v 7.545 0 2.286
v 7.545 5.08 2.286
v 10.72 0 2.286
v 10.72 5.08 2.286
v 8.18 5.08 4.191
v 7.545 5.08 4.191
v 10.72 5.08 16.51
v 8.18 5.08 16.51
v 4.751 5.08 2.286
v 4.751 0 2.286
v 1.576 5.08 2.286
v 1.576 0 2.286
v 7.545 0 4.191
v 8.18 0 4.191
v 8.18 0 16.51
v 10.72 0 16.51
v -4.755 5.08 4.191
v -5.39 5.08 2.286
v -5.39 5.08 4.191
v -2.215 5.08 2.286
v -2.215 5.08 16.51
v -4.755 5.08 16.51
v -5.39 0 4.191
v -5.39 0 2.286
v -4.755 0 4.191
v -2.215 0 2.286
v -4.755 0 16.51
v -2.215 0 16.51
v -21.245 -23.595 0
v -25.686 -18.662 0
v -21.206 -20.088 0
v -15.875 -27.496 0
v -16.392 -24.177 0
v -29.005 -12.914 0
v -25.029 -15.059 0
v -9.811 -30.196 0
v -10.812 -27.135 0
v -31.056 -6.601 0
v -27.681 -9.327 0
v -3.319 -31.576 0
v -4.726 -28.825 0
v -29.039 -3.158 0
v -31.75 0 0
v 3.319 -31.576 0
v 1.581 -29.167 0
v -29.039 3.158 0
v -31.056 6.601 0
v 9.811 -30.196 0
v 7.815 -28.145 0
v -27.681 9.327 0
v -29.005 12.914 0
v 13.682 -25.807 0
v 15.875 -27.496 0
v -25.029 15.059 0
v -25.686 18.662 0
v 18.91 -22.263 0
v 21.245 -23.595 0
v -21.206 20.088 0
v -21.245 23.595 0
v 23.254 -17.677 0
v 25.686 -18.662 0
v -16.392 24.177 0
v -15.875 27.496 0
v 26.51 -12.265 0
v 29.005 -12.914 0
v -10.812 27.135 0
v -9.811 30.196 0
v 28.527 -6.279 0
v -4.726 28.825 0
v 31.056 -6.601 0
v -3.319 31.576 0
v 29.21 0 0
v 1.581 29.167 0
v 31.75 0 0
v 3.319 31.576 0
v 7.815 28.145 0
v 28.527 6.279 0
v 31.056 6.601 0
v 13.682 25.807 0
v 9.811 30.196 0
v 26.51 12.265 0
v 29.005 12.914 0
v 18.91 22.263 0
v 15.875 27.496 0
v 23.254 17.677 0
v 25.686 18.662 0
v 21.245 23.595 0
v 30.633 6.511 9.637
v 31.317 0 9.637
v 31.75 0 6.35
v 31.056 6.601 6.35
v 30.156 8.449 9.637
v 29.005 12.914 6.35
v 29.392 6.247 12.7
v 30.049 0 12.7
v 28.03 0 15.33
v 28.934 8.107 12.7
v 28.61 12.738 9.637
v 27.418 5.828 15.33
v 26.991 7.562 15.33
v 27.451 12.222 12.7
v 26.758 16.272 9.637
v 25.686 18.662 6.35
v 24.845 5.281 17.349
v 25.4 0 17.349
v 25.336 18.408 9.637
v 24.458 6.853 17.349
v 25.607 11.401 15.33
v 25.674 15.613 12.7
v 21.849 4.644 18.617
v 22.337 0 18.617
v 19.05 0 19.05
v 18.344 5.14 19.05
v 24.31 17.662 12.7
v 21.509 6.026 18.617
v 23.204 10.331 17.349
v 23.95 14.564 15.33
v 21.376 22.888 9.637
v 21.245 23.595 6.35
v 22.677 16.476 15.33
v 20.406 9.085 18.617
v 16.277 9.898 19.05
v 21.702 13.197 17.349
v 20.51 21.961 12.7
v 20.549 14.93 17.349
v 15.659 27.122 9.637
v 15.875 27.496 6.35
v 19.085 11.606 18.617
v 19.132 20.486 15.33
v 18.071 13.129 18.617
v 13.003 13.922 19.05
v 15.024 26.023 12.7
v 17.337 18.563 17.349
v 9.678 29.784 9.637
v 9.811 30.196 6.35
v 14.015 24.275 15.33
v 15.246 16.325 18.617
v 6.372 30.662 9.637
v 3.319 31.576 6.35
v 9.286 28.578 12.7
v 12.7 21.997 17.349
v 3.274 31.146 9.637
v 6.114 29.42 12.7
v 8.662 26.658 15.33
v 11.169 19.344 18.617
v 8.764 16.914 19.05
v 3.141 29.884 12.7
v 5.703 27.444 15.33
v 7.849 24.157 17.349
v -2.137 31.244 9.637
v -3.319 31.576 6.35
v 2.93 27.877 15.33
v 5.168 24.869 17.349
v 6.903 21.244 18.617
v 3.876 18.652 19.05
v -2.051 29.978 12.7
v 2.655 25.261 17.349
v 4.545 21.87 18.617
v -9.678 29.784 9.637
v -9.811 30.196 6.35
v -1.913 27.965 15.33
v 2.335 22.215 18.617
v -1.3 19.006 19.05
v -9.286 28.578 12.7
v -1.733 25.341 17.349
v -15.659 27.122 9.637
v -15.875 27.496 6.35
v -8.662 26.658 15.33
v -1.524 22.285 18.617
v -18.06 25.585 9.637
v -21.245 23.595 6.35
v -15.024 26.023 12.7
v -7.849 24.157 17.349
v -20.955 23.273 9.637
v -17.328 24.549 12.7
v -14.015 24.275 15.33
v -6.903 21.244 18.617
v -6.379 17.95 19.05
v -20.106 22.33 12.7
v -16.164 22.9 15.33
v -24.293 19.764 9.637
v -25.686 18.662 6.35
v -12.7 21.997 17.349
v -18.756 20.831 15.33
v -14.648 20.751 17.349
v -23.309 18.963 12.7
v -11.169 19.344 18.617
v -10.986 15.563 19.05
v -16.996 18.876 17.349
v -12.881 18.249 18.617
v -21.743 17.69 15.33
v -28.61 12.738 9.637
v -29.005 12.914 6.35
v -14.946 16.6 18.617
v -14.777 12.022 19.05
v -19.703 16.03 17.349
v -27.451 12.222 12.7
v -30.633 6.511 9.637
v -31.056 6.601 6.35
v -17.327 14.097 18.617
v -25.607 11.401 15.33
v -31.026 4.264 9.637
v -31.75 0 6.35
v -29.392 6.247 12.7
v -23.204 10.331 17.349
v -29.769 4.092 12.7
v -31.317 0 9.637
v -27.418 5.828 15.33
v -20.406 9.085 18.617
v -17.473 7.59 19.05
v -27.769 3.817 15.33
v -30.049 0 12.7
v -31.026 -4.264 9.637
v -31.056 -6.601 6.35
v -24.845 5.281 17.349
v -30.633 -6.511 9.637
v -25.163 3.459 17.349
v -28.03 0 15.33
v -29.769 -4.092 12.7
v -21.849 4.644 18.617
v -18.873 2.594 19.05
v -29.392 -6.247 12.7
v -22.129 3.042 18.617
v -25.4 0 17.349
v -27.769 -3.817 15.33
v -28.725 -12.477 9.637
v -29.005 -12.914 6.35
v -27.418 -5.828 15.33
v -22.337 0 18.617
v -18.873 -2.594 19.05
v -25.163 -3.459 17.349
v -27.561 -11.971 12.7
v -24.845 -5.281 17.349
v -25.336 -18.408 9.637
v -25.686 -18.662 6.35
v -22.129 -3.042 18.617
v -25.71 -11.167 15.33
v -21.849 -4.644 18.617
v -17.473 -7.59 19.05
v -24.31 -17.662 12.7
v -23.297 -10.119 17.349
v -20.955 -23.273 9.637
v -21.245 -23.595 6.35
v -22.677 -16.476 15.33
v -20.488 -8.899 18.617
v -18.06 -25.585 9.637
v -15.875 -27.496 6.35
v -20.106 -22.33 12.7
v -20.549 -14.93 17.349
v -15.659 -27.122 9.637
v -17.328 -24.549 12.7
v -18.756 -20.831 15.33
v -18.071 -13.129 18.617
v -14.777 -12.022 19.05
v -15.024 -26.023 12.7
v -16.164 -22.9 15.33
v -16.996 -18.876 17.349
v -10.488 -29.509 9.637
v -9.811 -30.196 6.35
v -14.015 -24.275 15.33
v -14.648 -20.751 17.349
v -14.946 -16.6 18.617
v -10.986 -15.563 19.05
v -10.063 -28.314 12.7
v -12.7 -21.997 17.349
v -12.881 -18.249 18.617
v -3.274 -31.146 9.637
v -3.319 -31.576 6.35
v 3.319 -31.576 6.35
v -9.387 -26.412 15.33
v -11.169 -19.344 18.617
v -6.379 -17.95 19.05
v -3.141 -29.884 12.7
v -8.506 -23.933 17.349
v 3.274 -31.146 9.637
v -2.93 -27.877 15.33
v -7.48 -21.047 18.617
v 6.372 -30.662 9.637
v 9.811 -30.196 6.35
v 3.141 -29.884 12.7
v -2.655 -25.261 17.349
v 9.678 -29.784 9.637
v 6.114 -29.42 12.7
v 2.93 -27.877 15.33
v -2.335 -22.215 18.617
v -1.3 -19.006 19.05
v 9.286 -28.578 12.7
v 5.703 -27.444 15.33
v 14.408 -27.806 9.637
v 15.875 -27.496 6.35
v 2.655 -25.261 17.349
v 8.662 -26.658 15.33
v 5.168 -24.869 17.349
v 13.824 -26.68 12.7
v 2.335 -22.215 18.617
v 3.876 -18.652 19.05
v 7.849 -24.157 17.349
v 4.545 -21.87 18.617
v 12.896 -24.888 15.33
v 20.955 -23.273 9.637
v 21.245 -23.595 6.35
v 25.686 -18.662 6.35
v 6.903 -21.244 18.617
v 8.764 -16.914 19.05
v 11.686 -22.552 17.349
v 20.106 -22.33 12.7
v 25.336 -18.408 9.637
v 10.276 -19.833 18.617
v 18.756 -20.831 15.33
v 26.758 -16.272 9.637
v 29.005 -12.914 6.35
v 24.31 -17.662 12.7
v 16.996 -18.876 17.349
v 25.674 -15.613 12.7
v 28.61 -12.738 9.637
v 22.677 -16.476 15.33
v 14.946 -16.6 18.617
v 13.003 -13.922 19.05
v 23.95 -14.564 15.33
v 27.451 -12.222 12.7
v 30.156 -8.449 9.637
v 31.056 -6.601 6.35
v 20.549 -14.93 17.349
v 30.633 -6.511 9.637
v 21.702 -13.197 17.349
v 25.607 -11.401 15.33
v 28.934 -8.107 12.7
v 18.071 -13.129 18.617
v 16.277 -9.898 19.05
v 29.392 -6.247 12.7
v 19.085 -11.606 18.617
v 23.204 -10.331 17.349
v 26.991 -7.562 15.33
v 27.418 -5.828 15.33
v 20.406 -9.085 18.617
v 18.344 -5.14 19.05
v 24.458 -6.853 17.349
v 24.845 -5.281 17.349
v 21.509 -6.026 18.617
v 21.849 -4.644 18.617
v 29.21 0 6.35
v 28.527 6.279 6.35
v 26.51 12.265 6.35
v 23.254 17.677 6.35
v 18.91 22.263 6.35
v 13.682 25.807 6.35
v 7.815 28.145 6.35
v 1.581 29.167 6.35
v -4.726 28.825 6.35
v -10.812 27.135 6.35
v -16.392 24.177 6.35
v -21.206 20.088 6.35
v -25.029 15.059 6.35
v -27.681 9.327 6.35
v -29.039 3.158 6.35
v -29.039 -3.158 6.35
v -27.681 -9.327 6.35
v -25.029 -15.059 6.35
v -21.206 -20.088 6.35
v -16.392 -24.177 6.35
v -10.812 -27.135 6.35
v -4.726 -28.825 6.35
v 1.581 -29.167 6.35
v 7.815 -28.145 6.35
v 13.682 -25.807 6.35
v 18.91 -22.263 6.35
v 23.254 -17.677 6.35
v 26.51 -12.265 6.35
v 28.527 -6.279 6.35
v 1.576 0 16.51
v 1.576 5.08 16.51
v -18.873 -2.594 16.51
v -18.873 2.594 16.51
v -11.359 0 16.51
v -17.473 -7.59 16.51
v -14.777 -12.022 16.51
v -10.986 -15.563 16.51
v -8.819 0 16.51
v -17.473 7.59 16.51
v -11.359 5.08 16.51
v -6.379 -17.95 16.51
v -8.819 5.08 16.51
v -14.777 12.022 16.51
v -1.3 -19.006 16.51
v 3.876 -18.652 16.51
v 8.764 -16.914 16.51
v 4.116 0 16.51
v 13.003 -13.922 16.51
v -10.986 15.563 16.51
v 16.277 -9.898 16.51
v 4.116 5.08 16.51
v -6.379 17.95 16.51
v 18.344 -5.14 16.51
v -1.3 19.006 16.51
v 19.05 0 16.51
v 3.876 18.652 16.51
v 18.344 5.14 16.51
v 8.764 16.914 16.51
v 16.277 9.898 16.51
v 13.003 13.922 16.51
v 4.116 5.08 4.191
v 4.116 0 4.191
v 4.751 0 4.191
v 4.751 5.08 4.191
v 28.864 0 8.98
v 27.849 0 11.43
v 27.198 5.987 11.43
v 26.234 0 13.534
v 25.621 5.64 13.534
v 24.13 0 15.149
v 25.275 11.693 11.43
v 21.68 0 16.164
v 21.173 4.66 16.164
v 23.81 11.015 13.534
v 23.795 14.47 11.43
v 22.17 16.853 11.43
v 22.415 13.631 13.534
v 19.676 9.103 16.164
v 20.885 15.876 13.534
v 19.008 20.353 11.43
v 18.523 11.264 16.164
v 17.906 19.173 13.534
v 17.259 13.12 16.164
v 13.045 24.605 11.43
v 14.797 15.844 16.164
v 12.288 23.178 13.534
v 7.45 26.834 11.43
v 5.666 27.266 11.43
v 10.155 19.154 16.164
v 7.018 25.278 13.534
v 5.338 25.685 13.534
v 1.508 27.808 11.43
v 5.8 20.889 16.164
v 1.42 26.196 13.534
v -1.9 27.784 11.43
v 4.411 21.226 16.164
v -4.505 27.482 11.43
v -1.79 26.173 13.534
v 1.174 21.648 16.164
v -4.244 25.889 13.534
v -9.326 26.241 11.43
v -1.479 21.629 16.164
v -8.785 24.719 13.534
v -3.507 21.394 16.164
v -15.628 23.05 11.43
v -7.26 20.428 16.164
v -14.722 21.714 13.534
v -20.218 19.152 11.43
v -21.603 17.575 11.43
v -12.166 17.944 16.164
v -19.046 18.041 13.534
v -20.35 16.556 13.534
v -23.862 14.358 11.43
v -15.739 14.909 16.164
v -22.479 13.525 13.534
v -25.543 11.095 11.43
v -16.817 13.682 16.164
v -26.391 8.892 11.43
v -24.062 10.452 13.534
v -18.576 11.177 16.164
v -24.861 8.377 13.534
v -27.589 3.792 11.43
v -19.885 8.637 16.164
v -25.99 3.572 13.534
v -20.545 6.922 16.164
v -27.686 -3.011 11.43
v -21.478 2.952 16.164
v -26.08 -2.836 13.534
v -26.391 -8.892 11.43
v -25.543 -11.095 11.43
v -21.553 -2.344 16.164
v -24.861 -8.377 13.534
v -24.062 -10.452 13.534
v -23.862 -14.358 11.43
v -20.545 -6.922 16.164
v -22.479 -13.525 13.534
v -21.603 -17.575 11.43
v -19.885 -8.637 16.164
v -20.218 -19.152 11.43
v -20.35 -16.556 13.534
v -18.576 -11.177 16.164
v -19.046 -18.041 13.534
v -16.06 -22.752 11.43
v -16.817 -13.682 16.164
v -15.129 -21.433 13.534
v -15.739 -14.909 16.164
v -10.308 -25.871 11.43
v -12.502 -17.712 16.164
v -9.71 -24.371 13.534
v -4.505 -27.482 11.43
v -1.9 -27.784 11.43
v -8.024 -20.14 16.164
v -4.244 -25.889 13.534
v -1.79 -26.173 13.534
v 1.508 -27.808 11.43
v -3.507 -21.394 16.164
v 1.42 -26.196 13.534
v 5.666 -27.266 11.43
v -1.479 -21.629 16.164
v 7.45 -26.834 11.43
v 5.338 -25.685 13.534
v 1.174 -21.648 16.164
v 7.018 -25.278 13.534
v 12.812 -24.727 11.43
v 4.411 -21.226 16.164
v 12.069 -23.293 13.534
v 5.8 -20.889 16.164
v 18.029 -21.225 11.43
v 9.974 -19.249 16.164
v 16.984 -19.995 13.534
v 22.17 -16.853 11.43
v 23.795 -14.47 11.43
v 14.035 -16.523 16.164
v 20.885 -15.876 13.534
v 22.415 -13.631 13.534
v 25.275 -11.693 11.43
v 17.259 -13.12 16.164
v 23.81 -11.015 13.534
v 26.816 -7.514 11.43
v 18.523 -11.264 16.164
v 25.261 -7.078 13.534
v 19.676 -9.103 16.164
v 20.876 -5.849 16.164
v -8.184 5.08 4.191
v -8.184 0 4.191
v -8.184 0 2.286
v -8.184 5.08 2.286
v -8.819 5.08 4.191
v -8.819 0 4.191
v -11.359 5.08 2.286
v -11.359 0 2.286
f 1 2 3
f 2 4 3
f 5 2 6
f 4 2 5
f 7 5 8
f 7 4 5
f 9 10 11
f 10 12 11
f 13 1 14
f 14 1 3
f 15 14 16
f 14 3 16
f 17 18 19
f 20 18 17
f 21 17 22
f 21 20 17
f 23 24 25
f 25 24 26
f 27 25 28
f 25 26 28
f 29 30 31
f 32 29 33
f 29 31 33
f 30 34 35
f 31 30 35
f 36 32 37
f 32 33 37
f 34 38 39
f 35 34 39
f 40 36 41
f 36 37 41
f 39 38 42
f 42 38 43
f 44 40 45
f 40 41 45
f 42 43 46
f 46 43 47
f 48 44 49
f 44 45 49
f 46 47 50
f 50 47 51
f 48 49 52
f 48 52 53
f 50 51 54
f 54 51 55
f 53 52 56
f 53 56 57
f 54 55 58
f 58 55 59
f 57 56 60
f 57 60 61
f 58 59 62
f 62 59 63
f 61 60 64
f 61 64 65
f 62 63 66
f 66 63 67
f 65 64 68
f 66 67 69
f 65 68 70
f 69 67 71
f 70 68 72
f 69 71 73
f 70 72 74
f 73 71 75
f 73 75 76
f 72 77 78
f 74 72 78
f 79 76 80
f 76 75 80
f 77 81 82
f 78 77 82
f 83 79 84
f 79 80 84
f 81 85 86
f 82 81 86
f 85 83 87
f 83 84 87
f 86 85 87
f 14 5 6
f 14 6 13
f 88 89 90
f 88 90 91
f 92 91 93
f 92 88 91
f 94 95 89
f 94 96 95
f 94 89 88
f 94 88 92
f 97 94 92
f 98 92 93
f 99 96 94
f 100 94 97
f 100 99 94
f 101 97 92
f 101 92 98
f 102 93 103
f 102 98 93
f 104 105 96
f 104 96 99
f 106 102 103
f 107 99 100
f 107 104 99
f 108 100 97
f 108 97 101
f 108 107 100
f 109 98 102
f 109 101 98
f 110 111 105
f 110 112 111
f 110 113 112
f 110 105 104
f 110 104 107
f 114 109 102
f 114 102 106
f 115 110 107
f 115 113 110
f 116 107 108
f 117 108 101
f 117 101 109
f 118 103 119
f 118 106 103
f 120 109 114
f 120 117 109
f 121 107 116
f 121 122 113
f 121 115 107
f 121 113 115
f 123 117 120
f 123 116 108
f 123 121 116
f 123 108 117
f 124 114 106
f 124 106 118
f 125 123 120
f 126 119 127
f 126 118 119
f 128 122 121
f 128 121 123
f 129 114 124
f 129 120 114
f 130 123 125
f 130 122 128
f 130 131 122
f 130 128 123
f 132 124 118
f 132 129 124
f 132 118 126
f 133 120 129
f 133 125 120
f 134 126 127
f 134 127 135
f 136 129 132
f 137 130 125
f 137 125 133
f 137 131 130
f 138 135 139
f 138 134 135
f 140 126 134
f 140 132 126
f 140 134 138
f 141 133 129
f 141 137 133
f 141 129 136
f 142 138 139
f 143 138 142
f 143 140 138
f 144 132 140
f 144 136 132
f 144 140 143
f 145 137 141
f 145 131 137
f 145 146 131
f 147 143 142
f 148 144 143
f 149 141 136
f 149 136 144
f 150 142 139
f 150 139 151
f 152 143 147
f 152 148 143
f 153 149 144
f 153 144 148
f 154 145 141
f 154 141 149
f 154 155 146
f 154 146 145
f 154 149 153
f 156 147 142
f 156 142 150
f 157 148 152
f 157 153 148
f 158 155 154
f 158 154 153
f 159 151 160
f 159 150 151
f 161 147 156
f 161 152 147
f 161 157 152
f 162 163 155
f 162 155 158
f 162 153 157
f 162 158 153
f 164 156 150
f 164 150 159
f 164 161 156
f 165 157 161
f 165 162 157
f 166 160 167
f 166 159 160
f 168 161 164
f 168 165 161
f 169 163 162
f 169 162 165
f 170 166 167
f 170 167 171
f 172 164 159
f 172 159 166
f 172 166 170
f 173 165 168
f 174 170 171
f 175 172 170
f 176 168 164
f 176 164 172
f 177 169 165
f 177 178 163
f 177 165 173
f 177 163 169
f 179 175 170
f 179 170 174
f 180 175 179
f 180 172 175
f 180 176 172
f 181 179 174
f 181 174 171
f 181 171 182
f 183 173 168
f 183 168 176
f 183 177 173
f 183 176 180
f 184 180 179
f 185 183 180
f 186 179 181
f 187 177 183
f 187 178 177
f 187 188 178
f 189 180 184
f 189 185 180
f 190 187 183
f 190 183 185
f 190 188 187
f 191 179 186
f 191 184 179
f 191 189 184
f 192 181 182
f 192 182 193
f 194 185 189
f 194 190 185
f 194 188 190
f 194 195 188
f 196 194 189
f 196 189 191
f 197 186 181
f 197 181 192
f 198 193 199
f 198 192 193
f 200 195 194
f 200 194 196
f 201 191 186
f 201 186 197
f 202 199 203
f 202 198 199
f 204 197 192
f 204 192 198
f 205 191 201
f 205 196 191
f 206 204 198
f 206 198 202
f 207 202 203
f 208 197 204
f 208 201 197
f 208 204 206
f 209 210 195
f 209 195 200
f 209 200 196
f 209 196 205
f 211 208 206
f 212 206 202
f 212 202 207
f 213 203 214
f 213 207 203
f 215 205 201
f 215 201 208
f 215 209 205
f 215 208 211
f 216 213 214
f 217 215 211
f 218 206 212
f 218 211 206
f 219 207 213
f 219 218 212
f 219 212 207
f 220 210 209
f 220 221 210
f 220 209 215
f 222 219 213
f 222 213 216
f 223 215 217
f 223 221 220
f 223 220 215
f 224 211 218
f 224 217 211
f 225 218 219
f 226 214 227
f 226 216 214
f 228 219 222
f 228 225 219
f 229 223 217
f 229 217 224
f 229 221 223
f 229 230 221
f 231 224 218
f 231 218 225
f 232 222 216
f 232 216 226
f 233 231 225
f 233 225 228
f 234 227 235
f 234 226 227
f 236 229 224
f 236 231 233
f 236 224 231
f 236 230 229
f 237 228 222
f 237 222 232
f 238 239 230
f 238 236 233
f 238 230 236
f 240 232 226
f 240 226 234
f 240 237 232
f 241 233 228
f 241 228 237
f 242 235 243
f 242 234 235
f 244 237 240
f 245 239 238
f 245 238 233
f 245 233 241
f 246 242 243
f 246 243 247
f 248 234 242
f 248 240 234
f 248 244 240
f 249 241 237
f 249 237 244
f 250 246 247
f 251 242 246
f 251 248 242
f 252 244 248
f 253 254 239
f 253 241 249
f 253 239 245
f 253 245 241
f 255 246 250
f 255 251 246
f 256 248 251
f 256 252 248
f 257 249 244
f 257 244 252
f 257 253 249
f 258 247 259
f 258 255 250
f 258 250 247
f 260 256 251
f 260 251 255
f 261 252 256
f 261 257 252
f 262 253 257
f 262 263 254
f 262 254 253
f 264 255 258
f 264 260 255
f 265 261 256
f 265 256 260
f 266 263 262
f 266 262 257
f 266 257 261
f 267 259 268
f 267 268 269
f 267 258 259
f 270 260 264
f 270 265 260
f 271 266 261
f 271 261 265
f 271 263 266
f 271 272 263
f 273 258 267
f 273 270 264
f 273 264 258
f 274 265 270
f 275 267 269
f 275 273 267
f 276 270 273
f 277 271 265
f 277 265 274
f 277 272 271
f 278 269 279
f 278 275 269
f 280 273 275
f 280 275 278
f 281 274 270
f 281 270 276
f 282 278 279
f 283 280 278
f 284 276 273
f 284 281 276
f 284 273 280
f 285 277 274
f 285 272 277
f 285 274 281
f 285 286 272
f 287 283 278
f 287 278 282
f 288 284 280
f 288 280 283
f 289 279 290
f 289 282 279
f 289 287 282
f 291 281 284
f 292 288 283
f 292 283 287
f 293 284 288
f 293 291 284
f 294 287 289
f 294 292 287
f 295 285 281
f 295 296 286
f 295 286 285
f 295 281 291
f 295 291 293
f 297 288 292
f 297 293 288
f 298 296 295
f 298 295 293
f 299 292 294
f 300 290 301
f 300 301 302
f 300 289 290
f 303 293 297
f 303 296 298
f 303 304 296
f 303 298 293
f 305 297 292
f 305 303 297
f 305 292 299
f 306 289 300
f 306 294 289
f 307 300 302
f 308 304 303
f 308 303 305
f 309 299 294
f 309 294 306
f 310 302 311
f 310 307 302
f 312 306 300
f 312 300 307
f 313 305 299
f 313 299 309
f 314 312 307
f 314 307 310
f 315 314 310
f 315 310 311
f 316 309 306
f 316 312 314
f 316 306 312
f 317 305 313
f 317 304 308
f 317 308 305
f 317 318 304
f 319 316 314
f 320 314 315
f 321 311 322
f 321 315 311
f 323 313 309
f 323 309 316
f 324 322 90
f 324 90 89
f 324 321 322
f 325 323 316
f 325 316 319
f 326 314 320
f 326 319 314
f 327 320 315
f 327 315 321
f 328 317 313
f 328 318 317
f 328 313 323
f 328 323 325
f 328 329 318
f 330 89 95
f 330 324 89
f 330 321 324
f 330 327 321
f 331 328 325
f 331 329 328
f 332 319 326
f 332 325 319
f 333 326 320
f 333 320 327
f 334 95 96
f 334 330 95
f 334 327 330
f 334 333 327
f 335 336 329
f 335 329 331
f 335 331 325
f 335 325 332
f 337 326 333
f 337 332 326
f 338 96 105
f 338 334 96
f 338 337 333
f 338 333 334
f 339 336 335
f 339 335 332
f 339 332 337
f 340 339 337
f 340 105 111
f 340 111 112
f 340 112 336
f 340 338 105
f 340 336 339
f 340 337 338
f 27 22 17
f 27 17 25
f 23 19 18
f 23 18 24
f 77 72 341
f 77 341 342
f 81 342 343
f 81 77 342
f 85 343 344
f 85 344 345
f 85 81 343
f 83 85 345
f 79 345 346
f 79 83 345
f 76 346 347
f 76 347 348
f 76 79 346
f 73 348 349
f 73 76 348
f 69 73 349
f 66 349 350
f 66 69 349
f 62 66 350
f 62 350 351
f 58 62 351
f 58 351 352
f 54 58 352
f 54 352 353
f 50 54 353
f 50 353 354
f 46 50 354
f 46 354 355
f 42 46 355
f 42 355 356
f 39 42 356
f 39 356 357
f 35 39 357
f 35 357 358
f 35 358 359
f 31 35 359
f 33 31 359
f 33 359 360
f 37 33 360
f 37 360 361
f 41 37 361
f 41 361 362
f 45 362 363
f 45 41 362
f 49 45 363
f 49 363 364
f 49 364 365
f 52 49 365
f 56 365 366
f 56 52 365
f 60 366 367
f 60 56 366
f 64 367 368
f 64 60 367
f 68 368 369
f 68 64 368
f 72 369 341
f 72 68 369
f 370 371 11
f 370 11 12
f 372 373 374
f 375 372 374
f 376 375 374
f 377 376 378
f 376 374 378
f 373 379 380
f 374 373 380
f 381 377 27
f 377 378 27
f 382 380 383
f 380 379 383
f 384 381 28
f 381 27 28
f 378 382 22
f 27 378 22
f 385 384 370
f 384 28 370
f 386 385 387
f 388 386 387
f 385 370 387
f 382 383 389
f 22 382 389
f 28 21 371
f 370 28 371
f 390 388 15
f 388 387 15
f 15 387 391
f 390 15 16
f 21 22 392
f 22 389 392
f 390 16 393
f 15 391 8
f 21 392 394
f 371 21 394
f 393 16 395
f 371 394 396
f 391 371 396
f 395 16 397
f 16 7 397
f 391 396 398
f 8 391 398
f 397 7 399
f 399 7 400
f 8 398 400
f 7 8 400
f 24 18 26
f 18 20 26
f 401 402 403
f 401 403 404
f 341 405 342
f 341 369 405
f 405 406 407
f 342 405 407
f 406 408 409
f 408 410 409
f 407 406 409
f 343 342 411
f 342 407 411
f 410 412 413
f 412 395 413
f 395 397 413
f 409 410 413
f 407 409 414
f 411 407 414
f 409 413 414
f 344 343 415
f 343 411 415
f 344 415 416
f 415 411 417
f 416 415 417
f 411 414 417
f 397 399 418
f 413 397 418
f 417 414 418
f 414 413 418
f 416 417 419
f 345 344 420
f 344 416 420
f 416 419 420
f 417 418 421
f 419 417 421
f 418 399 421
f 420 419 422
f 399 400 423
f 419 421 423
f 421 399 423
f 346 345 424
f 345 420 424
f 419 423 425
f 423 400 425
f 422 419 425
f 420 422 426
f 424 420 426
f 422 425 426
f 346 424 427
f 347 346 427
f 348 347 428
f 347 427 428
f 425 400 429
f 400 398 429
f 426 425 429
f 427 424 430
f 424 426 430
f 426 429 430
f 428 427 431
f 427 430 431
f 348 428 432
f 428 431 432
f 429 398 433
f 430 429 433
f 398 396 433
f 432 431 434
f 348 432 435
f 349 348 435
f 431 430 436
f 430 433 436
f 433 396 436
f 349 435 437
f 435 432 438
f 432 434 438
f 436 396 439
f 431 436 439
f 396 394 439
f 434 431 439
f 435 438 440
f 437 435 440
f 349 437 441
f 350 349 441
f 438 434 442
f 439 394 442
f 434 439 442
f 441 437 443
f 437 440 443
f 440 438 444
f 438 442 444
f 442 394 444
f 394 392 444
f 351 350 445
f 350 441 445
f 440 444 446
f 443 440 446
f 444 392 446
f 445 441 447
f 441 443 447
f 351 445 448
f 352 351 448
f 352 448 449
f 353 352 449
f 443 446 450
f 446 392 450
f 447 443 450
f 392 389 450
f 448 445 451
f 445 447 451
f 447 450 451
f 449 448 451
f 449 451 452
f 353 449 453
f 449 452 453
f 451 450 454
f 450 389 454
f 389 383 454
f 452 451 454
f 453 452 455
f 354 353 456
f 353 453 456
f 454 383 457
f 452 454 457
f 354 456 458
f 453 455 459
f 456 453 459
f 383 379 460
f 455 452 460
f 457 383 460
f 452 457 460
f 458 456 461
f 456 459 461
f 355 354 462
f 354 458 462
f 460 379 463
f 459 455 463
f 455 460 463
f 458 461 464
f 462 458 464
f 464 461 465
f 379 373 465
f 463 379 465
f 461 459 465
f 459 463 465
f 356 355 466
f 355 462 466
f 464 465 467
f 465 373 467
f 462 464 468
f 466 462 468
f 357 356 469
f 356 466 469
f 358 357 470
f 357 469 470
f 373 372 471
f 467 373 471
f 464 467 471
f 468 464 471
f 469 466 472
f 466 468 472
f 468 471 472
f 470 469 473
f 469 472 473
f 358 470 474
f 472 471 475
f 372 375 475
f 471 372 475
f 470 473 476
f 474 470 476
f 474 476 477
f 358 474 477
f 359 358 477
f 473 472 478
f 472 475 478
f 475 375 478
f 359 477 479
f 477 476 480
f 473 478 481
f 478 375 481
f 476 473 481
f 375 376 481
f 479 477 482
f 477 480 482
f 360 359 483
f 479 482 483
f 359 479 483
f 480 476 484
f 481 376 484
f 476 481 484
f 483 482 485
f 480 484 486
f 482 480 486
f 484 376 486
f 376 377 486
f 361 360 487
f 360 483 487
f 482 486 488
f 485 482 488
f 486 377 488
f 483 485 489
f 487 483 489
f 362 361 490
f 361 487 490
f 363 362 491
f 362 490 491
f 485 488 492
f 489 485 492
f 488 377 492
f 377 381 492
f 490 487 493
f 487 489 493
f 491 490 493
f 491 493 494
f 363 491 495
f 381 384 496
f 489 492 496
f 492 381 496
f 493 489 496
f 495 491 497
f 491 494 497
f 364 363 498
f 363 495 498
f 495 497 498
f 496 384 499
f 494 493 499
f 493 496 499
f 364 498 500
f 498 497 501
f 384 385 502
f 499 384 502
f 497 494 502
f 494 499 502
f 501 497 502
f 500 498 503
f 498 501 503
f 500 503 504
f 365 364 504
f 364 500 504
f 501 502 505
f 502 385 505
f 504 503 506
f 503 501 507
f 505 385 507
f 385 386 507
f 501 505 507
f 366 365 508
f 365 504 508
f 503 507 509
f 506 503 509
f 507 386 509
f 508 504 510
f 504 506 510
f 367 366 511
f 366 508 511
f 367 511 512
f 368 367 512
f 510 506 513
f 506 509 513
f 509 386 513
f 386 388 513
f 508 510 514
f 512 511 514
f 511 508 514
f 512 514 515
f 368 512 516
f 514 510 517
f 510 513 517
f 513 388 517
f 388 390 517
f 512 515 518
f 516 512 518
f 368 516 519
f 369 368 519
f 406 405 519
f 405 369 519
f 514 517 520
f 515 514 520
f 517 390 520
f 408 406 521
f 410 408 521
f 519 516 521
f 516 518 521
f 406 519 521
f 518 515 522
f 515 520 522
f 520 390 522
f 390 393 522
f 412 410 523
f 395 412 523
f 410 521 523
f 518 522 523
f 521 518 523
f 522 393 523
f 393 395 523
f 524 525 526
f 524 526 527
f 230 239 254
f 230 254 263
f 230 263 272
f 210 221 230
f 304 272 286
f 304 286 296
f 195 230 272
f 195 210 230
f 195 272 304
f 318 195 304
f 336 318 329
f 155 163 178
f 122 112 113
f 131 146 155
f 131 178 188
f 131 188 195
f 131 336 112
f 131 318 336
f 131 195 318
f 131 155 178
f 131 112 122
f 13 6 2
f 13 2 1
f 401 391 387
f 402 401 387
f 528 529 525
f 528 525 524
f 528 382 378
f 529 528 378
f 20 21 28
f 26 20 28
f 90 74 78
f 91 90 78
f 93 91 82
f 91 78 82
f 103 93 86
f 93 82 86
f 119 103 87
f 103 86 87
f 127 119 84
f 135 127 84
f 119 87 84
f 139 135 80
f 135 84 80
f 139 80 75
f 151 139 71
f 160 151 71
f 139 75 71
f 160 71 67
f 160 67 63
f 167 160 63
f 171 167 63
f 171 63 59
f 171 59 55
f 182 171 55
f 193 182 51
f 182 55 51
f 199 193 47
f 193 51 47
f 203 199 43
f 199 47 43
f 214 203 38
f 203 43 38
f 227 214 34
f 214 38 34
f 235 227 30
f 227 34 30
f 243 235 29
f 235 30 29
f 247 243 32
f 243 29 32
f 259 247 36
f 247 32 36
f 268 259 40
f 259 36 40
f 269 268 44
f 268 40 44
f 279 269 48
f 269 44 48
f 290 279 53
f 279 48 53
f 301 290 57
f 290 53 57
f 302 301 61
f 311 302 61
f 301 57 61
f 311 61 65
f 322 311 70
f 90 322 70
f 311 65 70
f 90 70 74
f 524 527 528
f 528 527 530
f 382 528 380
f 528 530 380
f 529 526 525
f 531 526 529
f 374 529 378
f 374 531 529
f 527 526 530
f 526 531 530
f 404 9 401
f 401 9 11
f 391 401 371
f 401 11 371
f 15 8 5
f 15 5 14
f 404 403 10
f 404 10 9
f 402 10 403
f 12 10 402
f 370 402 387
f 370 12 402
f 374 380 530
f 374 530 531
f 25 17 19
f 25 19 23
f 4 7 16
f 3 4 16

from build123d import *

# Parameters (mm, degrees)
F0_R      = 31.75
F1_DEPTH  = 19.05
F2_R      = 12.7
F3_T      = -2.54
F5_W      = 2.54
F5_H      = 5.08
F6_DEPTH  = 14.224
F7_W      = 5.08
F7_H      = 1.905
F8_DEPTH  = 0.635
F9_W      = 5.08
F9_H      = 1.905
F10_DEPTH = 0.635
F11_W     = 5.08
F11_H     = 1.905
F12_DEPTH = 0.635
F13_W     = 5.08
F13_H     = 1.905
F14_DEPTH = 0.635


with BuildPart() as f1:
    # F0 (on Top) → F1 (new body)
    with BuildSketch(Plane.XY):
        Circle(F0_R)
    extrude(amount=F1_DEPTH)

    # F2
    f2_edges = [f1.edges().sort_by_distance(p)[0] for p in [
        (-31.75, 0, 19.05),
    ]]
    fillet(f2_edges, radius=F2_R)

    # F3
    f3_openings = [f1.faces().sort_by_distance(p)[0] for p in [
        (0, 0, 0),
    ]]
    offset(amount=F3_T, openings=f3_openings)

    # F5 (on face) → F6 (join)
    with BuildSketch(Plane(origin=(0, 0, 16.51), x_dir=(1, 0, 0), z_dir=(0, 0, -1))):
        with Locations((9.449818, -2.54)):
            Rectangle(F5_W, F5_H)
        with Locations((2.845818, -2.54)):
            Rectangle(F5_W, F5_H)
        with Locations((-3.48516, -2.54)):
            Rectangle(F5_W, F5_H)
        with Locations((-10.08916, -2.54)):
            Rectangle(F5_W, F5_H)
    extrude(amount=F6_DEPTH)

    # F7 (on face) → F8 (join)
    with BuildSketch(Plane(origin=(-4.75516, 0, 0), x_dir=(0, -1, 0), z_dir=(-1, 0, 0))):
        with Locations((-2.54, 3.2385)):
            Rectangle(F7_W, F7_H)
    extrude(amount=F8_DEPTH)

    # F9 (on face) → F10 (join)
    with BuildSketch(Plane.YZ.offset(4.115818)):
        with Locations((2.54, 3.2385)):
            Rectangle(F9_W, F9_H)
    extrude(amount=F10_DEPTH)

    # F11 (on face) → F12 (join)
    with BuildSketch(Plane(origin=(8.179818, 0, 0), x_dir=(0, -1, 0), z_dir=(-1, 0, 0))):
        with Locations((-2.54, 3.2385)):
            Rectangle(F11_W, F11_H)
    extrude(amount=F12_DEPTH)

    # F13 (on face) → F14 (join)
    with BuildSketch(Plane.YZ.offset(-8.81916)):
        with Locations((2.54, 3.2385)):
            Rectangle(F13_W, F13_H)
    extrude(amount=F14_DEPTH)


solid = f1.part
